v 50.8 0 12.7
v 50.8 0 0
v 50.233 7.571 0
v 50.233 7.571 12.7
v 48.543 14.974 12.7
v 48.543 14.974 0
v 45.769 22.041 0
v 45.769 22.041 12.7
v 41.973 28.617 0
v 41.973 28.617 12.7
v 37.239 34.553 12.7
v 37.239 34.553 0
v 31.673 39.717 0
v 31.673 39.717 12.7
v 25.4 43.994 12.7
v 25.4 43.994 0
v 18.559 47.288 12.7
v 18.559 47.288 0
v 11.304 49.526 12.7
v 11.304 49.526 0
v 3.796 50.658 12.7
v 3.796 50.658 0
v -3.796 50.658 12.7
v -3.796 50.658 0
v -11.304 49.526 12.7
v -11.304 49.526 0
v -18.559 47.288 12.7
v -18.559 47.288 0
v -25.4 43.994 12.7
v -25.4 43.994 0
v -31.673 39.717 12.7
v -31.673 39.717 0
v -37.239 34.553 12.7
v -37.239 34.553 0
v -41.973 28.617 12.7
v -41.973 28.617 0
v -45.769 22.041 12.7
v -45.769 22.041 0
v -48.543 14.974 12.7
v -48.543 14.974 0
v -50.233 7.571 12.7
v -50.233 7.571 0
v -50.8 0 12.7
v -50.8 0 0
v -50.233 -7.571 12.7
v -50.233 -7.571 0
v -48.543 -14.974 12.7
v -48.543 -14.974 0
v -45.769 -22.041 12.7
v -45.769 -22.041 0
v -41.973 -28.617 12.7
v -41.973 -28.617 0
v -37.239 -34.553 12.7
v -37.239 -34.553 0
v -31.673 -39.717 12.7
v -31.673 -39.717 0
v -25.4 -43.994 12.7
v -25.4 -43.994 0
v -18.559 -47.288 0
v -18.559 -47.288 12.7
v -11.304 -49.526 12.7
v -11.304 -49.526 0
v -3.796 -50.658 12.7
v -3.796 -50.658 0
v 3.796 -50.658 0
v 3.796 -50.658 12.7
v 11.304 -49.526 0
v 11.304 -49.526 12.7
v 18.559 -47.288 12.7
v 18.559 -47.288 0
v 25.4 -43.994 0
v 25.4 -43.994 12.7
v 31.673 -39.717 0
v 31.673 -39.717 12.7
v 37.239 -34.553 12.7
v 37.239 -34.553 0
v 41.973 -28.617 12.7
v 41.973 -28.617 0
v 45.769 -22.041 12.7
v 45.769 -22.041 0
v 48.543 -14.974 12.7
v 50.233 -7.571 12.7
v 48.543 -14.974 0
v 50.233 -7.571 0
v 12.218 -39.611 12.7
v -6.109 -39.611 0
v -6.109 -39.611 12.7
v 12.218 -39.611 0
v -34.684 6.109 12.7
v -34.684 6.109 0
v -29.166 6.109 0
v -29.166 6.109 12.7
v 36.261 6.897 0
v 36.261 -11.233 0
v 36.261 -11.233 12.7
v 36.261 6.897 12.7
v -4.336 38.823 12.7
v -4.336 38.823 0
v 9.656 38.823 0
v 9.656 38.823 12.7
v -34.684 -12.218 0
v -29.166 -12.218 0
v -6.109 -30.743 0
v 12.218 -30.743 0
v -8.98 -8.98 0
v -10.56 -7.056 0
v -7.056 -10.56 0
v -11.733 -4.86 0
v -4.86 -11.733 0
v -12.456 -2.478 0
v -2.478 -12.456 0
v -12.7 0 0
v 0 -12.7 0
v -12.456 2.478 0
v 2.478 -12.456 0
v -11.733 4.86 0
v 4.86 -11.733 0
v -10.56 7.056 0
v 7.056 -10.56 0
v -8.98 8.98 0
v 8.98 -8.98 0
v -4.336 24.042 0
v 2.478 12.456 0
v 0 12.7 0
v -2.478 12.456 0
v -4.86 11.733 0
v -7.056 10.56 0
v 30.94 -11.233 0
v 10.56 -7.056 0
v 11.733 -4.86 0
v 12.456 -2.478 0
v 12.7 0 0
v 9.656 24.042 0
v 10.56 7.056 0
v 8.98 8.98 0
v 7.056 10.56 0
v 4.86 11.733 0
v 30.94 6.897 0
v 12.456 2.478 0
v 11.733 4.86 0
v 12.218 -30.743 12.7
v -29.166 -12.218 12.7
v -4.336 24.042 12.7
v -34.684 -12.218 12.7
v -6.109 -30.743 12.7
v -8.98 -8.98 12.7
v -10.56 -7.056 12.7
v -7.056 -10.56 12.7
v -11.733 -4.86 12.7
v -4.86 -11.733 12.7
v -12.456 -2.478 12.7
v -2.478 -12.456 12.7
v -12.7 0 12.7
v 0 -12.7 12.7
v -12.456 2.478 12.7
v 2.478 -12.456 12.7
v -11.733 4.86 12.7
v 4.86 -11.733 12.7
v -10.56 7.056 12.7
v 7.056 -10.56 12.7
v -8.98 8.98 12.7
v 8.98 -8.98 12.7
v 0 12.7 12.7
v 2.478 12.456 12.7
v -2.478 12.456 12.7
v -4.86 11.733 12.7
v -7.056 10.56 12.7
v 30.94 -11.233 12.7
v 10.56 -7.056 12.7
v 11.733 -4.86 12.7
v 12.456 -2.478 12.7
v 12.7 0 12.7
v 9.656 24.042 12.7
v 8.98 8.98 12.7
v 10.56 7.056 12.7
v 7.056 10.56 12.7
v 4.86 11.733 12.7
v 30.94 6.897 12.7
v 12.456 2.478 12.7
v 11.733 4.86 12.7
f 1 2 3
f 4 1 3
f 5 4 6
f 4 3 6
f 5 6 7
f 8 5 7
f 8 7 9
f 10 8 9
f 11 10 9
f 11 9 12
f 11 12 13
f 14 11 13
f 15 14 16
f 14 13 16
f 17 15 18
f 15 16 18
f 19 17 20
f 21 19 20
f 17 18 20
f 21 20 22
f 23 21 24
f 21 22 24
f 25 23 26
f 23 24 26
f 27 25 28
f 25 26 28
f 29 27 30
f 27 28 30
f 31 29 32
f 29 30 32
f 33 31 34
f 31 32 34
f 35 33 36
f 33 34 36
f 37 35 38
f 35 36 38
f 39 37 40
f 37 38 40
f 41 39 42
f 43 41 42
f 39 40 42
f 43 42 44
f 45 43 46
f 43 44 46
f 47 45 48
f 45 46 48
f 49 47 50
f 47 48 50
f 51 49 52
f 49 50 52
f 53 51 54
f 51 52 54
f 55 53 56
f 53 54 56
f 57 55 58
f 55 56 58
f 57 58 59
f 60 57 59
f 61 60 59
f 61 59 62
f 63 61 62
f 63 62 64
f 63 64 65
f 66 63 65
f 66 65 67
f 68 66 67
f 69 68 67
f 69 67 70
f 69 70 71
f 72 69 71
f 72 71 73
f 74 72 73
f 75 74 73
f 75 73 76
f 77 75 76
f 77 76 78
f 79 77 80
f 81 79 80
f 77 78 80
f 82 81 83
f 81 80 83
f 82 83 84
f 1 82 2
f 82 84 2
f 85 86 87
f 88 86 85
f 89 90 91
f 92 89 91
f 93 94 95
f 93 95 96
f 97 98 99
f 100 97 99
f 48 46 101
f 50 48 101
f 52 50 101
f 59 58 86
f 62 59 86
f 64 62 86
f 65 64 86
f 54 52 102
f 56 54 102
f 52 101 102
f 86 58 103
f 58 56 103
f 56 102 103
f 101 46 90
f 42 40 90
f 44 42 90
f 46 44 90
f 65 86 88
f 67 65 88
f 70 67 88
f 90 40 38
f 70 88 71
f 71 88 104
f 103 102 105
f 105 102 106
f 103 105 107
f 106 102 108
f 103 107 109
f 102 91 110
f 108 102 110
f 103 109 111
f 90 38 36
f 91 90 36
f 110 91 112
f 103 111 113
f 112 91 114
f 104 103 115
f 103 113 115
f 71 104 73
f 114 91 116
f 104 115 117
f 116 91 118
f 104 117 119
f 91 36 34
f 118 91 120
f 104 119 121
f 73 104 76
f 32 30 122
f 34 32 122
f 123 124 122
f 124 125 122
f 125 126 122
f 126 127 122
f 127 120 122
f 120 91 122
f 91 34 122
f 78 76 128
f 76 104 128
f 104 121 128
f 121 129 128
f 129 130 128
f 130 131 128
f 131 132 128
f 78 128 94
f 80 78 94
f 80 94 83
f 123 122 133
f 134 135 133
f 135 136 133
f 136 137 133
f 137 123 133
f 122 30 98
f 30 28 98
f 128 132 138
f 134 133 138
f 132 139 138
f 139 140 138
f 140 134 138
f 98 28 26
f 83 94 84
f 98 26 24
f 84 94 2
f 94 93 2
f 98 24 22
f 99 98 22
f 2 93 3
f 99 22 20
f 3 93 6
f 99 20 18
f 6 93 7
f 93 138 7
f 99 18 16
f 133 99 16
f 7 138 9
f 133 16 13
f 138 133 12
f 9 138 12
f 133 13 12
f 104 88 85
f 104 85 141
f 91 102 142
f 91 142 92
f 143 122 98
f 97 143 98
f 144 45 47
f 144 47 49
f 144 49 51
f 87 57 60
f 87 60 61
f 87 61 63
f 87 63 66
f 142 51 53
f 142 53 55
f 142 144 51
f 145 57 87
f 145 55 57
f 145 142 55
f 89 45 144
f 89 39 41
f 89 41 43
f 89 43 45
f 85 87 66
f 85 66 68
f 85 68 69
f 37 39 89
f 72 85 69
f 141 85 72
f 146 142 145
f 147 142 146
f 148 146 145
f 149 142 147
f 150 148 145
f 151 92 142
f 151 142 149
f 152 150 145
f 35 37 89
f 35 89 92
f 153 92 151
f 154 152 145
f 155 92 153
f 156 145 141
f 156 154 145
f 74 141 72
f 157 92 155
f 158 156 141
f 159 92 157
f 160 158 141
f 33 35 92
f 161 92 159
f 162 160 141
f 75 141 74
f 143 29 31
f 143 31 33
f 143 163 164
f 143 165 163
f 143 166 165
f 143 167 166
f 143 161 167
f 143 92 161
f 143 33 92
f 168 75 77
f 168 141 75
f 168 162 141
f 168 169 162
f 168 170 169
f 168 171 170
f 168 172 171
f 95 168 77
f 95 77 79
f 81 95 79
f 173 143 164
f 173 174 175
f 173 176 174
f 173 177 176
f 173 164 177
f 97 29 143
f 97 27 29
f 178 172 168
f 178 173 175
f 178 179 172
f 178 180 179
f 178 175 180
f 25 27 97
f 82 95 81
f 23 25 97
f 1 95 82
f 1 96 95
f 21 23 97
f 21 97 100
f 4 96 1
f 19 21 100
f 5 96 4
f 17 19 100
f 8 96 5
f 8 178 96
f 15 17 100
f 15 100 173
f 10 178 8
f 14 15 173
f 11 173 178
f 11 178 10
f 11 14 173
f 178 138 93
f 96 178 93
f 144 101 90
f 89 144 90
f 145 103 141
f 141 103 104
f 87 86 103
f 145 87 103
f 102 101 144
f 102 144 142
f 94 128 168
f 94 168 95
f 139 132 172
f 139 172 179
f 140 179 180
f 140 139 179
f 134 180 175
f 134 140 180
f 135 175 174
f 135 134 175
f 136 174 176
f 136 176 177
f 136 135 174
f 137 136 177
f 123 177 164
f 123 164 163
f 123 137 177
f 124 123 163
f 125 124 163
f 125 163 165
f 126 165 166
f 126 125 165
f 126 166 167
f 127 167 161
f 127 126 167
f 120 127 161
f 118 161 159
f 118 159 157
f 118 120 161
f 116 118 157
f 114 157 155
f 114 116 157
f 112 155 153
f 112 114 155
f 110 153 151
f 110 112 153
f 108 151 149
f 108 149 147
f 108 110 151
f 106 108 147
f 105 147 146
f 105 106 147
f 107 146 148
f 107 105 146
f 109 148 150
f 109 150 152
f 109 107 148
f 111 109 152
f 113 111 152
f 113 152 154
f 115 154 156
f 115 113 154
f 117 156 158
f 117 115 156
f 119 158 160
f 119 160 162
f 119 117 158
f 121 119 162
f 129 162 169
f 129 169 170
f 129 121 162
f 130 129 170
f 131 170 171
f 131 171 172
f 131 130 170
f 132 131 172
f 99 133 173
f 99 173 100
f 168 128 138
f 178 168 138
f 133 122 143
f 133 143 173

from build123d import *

# Parameters (mm, degrees)
F0_R     = 50.8
F0_W     = 5.51793
F0_H     = 18.327414
F0_R_2   = 12.7
F0_W_2   = 18.327416
F0_H_2   = 8.868104
F0_W_3   = 5.320862
F0_H_3   = 18.130345
F0_W_4   = 13.991896
F0_H_4   = 14.780173
F1_DEPTH = 12.7


with BuildPart() as f1:
    # F0 (on Top) → F1 (new body)
    with BuildSketch(Plane.XY):
        Circle(F0_R)
        with Locations((-31.925172, -3.054569)):
            Rectangle(F0_W, F0_H, mode=Mode.SUBTRACT)
        Circle(F0_R_2, mode=Mode.SUBTRACT)
        with Locations((3.05457, -35.176811)):
            Rectangle(F0_W_2, F0_H_2, mode=Mode.SUBTRACT)
        with Locations((33.60026, -2.167758)):
            Rectangle(F0_W_3, F0_H_3, mode=Mode.SUBTRACT)
        with Locations((2.660431, 31.432501)):
            Rectangle(F0_W_4, F0_H_4, mode=Mode.SUBTRACT)
    extrude(amount=F1_DEPTH)


solid = f1.part
